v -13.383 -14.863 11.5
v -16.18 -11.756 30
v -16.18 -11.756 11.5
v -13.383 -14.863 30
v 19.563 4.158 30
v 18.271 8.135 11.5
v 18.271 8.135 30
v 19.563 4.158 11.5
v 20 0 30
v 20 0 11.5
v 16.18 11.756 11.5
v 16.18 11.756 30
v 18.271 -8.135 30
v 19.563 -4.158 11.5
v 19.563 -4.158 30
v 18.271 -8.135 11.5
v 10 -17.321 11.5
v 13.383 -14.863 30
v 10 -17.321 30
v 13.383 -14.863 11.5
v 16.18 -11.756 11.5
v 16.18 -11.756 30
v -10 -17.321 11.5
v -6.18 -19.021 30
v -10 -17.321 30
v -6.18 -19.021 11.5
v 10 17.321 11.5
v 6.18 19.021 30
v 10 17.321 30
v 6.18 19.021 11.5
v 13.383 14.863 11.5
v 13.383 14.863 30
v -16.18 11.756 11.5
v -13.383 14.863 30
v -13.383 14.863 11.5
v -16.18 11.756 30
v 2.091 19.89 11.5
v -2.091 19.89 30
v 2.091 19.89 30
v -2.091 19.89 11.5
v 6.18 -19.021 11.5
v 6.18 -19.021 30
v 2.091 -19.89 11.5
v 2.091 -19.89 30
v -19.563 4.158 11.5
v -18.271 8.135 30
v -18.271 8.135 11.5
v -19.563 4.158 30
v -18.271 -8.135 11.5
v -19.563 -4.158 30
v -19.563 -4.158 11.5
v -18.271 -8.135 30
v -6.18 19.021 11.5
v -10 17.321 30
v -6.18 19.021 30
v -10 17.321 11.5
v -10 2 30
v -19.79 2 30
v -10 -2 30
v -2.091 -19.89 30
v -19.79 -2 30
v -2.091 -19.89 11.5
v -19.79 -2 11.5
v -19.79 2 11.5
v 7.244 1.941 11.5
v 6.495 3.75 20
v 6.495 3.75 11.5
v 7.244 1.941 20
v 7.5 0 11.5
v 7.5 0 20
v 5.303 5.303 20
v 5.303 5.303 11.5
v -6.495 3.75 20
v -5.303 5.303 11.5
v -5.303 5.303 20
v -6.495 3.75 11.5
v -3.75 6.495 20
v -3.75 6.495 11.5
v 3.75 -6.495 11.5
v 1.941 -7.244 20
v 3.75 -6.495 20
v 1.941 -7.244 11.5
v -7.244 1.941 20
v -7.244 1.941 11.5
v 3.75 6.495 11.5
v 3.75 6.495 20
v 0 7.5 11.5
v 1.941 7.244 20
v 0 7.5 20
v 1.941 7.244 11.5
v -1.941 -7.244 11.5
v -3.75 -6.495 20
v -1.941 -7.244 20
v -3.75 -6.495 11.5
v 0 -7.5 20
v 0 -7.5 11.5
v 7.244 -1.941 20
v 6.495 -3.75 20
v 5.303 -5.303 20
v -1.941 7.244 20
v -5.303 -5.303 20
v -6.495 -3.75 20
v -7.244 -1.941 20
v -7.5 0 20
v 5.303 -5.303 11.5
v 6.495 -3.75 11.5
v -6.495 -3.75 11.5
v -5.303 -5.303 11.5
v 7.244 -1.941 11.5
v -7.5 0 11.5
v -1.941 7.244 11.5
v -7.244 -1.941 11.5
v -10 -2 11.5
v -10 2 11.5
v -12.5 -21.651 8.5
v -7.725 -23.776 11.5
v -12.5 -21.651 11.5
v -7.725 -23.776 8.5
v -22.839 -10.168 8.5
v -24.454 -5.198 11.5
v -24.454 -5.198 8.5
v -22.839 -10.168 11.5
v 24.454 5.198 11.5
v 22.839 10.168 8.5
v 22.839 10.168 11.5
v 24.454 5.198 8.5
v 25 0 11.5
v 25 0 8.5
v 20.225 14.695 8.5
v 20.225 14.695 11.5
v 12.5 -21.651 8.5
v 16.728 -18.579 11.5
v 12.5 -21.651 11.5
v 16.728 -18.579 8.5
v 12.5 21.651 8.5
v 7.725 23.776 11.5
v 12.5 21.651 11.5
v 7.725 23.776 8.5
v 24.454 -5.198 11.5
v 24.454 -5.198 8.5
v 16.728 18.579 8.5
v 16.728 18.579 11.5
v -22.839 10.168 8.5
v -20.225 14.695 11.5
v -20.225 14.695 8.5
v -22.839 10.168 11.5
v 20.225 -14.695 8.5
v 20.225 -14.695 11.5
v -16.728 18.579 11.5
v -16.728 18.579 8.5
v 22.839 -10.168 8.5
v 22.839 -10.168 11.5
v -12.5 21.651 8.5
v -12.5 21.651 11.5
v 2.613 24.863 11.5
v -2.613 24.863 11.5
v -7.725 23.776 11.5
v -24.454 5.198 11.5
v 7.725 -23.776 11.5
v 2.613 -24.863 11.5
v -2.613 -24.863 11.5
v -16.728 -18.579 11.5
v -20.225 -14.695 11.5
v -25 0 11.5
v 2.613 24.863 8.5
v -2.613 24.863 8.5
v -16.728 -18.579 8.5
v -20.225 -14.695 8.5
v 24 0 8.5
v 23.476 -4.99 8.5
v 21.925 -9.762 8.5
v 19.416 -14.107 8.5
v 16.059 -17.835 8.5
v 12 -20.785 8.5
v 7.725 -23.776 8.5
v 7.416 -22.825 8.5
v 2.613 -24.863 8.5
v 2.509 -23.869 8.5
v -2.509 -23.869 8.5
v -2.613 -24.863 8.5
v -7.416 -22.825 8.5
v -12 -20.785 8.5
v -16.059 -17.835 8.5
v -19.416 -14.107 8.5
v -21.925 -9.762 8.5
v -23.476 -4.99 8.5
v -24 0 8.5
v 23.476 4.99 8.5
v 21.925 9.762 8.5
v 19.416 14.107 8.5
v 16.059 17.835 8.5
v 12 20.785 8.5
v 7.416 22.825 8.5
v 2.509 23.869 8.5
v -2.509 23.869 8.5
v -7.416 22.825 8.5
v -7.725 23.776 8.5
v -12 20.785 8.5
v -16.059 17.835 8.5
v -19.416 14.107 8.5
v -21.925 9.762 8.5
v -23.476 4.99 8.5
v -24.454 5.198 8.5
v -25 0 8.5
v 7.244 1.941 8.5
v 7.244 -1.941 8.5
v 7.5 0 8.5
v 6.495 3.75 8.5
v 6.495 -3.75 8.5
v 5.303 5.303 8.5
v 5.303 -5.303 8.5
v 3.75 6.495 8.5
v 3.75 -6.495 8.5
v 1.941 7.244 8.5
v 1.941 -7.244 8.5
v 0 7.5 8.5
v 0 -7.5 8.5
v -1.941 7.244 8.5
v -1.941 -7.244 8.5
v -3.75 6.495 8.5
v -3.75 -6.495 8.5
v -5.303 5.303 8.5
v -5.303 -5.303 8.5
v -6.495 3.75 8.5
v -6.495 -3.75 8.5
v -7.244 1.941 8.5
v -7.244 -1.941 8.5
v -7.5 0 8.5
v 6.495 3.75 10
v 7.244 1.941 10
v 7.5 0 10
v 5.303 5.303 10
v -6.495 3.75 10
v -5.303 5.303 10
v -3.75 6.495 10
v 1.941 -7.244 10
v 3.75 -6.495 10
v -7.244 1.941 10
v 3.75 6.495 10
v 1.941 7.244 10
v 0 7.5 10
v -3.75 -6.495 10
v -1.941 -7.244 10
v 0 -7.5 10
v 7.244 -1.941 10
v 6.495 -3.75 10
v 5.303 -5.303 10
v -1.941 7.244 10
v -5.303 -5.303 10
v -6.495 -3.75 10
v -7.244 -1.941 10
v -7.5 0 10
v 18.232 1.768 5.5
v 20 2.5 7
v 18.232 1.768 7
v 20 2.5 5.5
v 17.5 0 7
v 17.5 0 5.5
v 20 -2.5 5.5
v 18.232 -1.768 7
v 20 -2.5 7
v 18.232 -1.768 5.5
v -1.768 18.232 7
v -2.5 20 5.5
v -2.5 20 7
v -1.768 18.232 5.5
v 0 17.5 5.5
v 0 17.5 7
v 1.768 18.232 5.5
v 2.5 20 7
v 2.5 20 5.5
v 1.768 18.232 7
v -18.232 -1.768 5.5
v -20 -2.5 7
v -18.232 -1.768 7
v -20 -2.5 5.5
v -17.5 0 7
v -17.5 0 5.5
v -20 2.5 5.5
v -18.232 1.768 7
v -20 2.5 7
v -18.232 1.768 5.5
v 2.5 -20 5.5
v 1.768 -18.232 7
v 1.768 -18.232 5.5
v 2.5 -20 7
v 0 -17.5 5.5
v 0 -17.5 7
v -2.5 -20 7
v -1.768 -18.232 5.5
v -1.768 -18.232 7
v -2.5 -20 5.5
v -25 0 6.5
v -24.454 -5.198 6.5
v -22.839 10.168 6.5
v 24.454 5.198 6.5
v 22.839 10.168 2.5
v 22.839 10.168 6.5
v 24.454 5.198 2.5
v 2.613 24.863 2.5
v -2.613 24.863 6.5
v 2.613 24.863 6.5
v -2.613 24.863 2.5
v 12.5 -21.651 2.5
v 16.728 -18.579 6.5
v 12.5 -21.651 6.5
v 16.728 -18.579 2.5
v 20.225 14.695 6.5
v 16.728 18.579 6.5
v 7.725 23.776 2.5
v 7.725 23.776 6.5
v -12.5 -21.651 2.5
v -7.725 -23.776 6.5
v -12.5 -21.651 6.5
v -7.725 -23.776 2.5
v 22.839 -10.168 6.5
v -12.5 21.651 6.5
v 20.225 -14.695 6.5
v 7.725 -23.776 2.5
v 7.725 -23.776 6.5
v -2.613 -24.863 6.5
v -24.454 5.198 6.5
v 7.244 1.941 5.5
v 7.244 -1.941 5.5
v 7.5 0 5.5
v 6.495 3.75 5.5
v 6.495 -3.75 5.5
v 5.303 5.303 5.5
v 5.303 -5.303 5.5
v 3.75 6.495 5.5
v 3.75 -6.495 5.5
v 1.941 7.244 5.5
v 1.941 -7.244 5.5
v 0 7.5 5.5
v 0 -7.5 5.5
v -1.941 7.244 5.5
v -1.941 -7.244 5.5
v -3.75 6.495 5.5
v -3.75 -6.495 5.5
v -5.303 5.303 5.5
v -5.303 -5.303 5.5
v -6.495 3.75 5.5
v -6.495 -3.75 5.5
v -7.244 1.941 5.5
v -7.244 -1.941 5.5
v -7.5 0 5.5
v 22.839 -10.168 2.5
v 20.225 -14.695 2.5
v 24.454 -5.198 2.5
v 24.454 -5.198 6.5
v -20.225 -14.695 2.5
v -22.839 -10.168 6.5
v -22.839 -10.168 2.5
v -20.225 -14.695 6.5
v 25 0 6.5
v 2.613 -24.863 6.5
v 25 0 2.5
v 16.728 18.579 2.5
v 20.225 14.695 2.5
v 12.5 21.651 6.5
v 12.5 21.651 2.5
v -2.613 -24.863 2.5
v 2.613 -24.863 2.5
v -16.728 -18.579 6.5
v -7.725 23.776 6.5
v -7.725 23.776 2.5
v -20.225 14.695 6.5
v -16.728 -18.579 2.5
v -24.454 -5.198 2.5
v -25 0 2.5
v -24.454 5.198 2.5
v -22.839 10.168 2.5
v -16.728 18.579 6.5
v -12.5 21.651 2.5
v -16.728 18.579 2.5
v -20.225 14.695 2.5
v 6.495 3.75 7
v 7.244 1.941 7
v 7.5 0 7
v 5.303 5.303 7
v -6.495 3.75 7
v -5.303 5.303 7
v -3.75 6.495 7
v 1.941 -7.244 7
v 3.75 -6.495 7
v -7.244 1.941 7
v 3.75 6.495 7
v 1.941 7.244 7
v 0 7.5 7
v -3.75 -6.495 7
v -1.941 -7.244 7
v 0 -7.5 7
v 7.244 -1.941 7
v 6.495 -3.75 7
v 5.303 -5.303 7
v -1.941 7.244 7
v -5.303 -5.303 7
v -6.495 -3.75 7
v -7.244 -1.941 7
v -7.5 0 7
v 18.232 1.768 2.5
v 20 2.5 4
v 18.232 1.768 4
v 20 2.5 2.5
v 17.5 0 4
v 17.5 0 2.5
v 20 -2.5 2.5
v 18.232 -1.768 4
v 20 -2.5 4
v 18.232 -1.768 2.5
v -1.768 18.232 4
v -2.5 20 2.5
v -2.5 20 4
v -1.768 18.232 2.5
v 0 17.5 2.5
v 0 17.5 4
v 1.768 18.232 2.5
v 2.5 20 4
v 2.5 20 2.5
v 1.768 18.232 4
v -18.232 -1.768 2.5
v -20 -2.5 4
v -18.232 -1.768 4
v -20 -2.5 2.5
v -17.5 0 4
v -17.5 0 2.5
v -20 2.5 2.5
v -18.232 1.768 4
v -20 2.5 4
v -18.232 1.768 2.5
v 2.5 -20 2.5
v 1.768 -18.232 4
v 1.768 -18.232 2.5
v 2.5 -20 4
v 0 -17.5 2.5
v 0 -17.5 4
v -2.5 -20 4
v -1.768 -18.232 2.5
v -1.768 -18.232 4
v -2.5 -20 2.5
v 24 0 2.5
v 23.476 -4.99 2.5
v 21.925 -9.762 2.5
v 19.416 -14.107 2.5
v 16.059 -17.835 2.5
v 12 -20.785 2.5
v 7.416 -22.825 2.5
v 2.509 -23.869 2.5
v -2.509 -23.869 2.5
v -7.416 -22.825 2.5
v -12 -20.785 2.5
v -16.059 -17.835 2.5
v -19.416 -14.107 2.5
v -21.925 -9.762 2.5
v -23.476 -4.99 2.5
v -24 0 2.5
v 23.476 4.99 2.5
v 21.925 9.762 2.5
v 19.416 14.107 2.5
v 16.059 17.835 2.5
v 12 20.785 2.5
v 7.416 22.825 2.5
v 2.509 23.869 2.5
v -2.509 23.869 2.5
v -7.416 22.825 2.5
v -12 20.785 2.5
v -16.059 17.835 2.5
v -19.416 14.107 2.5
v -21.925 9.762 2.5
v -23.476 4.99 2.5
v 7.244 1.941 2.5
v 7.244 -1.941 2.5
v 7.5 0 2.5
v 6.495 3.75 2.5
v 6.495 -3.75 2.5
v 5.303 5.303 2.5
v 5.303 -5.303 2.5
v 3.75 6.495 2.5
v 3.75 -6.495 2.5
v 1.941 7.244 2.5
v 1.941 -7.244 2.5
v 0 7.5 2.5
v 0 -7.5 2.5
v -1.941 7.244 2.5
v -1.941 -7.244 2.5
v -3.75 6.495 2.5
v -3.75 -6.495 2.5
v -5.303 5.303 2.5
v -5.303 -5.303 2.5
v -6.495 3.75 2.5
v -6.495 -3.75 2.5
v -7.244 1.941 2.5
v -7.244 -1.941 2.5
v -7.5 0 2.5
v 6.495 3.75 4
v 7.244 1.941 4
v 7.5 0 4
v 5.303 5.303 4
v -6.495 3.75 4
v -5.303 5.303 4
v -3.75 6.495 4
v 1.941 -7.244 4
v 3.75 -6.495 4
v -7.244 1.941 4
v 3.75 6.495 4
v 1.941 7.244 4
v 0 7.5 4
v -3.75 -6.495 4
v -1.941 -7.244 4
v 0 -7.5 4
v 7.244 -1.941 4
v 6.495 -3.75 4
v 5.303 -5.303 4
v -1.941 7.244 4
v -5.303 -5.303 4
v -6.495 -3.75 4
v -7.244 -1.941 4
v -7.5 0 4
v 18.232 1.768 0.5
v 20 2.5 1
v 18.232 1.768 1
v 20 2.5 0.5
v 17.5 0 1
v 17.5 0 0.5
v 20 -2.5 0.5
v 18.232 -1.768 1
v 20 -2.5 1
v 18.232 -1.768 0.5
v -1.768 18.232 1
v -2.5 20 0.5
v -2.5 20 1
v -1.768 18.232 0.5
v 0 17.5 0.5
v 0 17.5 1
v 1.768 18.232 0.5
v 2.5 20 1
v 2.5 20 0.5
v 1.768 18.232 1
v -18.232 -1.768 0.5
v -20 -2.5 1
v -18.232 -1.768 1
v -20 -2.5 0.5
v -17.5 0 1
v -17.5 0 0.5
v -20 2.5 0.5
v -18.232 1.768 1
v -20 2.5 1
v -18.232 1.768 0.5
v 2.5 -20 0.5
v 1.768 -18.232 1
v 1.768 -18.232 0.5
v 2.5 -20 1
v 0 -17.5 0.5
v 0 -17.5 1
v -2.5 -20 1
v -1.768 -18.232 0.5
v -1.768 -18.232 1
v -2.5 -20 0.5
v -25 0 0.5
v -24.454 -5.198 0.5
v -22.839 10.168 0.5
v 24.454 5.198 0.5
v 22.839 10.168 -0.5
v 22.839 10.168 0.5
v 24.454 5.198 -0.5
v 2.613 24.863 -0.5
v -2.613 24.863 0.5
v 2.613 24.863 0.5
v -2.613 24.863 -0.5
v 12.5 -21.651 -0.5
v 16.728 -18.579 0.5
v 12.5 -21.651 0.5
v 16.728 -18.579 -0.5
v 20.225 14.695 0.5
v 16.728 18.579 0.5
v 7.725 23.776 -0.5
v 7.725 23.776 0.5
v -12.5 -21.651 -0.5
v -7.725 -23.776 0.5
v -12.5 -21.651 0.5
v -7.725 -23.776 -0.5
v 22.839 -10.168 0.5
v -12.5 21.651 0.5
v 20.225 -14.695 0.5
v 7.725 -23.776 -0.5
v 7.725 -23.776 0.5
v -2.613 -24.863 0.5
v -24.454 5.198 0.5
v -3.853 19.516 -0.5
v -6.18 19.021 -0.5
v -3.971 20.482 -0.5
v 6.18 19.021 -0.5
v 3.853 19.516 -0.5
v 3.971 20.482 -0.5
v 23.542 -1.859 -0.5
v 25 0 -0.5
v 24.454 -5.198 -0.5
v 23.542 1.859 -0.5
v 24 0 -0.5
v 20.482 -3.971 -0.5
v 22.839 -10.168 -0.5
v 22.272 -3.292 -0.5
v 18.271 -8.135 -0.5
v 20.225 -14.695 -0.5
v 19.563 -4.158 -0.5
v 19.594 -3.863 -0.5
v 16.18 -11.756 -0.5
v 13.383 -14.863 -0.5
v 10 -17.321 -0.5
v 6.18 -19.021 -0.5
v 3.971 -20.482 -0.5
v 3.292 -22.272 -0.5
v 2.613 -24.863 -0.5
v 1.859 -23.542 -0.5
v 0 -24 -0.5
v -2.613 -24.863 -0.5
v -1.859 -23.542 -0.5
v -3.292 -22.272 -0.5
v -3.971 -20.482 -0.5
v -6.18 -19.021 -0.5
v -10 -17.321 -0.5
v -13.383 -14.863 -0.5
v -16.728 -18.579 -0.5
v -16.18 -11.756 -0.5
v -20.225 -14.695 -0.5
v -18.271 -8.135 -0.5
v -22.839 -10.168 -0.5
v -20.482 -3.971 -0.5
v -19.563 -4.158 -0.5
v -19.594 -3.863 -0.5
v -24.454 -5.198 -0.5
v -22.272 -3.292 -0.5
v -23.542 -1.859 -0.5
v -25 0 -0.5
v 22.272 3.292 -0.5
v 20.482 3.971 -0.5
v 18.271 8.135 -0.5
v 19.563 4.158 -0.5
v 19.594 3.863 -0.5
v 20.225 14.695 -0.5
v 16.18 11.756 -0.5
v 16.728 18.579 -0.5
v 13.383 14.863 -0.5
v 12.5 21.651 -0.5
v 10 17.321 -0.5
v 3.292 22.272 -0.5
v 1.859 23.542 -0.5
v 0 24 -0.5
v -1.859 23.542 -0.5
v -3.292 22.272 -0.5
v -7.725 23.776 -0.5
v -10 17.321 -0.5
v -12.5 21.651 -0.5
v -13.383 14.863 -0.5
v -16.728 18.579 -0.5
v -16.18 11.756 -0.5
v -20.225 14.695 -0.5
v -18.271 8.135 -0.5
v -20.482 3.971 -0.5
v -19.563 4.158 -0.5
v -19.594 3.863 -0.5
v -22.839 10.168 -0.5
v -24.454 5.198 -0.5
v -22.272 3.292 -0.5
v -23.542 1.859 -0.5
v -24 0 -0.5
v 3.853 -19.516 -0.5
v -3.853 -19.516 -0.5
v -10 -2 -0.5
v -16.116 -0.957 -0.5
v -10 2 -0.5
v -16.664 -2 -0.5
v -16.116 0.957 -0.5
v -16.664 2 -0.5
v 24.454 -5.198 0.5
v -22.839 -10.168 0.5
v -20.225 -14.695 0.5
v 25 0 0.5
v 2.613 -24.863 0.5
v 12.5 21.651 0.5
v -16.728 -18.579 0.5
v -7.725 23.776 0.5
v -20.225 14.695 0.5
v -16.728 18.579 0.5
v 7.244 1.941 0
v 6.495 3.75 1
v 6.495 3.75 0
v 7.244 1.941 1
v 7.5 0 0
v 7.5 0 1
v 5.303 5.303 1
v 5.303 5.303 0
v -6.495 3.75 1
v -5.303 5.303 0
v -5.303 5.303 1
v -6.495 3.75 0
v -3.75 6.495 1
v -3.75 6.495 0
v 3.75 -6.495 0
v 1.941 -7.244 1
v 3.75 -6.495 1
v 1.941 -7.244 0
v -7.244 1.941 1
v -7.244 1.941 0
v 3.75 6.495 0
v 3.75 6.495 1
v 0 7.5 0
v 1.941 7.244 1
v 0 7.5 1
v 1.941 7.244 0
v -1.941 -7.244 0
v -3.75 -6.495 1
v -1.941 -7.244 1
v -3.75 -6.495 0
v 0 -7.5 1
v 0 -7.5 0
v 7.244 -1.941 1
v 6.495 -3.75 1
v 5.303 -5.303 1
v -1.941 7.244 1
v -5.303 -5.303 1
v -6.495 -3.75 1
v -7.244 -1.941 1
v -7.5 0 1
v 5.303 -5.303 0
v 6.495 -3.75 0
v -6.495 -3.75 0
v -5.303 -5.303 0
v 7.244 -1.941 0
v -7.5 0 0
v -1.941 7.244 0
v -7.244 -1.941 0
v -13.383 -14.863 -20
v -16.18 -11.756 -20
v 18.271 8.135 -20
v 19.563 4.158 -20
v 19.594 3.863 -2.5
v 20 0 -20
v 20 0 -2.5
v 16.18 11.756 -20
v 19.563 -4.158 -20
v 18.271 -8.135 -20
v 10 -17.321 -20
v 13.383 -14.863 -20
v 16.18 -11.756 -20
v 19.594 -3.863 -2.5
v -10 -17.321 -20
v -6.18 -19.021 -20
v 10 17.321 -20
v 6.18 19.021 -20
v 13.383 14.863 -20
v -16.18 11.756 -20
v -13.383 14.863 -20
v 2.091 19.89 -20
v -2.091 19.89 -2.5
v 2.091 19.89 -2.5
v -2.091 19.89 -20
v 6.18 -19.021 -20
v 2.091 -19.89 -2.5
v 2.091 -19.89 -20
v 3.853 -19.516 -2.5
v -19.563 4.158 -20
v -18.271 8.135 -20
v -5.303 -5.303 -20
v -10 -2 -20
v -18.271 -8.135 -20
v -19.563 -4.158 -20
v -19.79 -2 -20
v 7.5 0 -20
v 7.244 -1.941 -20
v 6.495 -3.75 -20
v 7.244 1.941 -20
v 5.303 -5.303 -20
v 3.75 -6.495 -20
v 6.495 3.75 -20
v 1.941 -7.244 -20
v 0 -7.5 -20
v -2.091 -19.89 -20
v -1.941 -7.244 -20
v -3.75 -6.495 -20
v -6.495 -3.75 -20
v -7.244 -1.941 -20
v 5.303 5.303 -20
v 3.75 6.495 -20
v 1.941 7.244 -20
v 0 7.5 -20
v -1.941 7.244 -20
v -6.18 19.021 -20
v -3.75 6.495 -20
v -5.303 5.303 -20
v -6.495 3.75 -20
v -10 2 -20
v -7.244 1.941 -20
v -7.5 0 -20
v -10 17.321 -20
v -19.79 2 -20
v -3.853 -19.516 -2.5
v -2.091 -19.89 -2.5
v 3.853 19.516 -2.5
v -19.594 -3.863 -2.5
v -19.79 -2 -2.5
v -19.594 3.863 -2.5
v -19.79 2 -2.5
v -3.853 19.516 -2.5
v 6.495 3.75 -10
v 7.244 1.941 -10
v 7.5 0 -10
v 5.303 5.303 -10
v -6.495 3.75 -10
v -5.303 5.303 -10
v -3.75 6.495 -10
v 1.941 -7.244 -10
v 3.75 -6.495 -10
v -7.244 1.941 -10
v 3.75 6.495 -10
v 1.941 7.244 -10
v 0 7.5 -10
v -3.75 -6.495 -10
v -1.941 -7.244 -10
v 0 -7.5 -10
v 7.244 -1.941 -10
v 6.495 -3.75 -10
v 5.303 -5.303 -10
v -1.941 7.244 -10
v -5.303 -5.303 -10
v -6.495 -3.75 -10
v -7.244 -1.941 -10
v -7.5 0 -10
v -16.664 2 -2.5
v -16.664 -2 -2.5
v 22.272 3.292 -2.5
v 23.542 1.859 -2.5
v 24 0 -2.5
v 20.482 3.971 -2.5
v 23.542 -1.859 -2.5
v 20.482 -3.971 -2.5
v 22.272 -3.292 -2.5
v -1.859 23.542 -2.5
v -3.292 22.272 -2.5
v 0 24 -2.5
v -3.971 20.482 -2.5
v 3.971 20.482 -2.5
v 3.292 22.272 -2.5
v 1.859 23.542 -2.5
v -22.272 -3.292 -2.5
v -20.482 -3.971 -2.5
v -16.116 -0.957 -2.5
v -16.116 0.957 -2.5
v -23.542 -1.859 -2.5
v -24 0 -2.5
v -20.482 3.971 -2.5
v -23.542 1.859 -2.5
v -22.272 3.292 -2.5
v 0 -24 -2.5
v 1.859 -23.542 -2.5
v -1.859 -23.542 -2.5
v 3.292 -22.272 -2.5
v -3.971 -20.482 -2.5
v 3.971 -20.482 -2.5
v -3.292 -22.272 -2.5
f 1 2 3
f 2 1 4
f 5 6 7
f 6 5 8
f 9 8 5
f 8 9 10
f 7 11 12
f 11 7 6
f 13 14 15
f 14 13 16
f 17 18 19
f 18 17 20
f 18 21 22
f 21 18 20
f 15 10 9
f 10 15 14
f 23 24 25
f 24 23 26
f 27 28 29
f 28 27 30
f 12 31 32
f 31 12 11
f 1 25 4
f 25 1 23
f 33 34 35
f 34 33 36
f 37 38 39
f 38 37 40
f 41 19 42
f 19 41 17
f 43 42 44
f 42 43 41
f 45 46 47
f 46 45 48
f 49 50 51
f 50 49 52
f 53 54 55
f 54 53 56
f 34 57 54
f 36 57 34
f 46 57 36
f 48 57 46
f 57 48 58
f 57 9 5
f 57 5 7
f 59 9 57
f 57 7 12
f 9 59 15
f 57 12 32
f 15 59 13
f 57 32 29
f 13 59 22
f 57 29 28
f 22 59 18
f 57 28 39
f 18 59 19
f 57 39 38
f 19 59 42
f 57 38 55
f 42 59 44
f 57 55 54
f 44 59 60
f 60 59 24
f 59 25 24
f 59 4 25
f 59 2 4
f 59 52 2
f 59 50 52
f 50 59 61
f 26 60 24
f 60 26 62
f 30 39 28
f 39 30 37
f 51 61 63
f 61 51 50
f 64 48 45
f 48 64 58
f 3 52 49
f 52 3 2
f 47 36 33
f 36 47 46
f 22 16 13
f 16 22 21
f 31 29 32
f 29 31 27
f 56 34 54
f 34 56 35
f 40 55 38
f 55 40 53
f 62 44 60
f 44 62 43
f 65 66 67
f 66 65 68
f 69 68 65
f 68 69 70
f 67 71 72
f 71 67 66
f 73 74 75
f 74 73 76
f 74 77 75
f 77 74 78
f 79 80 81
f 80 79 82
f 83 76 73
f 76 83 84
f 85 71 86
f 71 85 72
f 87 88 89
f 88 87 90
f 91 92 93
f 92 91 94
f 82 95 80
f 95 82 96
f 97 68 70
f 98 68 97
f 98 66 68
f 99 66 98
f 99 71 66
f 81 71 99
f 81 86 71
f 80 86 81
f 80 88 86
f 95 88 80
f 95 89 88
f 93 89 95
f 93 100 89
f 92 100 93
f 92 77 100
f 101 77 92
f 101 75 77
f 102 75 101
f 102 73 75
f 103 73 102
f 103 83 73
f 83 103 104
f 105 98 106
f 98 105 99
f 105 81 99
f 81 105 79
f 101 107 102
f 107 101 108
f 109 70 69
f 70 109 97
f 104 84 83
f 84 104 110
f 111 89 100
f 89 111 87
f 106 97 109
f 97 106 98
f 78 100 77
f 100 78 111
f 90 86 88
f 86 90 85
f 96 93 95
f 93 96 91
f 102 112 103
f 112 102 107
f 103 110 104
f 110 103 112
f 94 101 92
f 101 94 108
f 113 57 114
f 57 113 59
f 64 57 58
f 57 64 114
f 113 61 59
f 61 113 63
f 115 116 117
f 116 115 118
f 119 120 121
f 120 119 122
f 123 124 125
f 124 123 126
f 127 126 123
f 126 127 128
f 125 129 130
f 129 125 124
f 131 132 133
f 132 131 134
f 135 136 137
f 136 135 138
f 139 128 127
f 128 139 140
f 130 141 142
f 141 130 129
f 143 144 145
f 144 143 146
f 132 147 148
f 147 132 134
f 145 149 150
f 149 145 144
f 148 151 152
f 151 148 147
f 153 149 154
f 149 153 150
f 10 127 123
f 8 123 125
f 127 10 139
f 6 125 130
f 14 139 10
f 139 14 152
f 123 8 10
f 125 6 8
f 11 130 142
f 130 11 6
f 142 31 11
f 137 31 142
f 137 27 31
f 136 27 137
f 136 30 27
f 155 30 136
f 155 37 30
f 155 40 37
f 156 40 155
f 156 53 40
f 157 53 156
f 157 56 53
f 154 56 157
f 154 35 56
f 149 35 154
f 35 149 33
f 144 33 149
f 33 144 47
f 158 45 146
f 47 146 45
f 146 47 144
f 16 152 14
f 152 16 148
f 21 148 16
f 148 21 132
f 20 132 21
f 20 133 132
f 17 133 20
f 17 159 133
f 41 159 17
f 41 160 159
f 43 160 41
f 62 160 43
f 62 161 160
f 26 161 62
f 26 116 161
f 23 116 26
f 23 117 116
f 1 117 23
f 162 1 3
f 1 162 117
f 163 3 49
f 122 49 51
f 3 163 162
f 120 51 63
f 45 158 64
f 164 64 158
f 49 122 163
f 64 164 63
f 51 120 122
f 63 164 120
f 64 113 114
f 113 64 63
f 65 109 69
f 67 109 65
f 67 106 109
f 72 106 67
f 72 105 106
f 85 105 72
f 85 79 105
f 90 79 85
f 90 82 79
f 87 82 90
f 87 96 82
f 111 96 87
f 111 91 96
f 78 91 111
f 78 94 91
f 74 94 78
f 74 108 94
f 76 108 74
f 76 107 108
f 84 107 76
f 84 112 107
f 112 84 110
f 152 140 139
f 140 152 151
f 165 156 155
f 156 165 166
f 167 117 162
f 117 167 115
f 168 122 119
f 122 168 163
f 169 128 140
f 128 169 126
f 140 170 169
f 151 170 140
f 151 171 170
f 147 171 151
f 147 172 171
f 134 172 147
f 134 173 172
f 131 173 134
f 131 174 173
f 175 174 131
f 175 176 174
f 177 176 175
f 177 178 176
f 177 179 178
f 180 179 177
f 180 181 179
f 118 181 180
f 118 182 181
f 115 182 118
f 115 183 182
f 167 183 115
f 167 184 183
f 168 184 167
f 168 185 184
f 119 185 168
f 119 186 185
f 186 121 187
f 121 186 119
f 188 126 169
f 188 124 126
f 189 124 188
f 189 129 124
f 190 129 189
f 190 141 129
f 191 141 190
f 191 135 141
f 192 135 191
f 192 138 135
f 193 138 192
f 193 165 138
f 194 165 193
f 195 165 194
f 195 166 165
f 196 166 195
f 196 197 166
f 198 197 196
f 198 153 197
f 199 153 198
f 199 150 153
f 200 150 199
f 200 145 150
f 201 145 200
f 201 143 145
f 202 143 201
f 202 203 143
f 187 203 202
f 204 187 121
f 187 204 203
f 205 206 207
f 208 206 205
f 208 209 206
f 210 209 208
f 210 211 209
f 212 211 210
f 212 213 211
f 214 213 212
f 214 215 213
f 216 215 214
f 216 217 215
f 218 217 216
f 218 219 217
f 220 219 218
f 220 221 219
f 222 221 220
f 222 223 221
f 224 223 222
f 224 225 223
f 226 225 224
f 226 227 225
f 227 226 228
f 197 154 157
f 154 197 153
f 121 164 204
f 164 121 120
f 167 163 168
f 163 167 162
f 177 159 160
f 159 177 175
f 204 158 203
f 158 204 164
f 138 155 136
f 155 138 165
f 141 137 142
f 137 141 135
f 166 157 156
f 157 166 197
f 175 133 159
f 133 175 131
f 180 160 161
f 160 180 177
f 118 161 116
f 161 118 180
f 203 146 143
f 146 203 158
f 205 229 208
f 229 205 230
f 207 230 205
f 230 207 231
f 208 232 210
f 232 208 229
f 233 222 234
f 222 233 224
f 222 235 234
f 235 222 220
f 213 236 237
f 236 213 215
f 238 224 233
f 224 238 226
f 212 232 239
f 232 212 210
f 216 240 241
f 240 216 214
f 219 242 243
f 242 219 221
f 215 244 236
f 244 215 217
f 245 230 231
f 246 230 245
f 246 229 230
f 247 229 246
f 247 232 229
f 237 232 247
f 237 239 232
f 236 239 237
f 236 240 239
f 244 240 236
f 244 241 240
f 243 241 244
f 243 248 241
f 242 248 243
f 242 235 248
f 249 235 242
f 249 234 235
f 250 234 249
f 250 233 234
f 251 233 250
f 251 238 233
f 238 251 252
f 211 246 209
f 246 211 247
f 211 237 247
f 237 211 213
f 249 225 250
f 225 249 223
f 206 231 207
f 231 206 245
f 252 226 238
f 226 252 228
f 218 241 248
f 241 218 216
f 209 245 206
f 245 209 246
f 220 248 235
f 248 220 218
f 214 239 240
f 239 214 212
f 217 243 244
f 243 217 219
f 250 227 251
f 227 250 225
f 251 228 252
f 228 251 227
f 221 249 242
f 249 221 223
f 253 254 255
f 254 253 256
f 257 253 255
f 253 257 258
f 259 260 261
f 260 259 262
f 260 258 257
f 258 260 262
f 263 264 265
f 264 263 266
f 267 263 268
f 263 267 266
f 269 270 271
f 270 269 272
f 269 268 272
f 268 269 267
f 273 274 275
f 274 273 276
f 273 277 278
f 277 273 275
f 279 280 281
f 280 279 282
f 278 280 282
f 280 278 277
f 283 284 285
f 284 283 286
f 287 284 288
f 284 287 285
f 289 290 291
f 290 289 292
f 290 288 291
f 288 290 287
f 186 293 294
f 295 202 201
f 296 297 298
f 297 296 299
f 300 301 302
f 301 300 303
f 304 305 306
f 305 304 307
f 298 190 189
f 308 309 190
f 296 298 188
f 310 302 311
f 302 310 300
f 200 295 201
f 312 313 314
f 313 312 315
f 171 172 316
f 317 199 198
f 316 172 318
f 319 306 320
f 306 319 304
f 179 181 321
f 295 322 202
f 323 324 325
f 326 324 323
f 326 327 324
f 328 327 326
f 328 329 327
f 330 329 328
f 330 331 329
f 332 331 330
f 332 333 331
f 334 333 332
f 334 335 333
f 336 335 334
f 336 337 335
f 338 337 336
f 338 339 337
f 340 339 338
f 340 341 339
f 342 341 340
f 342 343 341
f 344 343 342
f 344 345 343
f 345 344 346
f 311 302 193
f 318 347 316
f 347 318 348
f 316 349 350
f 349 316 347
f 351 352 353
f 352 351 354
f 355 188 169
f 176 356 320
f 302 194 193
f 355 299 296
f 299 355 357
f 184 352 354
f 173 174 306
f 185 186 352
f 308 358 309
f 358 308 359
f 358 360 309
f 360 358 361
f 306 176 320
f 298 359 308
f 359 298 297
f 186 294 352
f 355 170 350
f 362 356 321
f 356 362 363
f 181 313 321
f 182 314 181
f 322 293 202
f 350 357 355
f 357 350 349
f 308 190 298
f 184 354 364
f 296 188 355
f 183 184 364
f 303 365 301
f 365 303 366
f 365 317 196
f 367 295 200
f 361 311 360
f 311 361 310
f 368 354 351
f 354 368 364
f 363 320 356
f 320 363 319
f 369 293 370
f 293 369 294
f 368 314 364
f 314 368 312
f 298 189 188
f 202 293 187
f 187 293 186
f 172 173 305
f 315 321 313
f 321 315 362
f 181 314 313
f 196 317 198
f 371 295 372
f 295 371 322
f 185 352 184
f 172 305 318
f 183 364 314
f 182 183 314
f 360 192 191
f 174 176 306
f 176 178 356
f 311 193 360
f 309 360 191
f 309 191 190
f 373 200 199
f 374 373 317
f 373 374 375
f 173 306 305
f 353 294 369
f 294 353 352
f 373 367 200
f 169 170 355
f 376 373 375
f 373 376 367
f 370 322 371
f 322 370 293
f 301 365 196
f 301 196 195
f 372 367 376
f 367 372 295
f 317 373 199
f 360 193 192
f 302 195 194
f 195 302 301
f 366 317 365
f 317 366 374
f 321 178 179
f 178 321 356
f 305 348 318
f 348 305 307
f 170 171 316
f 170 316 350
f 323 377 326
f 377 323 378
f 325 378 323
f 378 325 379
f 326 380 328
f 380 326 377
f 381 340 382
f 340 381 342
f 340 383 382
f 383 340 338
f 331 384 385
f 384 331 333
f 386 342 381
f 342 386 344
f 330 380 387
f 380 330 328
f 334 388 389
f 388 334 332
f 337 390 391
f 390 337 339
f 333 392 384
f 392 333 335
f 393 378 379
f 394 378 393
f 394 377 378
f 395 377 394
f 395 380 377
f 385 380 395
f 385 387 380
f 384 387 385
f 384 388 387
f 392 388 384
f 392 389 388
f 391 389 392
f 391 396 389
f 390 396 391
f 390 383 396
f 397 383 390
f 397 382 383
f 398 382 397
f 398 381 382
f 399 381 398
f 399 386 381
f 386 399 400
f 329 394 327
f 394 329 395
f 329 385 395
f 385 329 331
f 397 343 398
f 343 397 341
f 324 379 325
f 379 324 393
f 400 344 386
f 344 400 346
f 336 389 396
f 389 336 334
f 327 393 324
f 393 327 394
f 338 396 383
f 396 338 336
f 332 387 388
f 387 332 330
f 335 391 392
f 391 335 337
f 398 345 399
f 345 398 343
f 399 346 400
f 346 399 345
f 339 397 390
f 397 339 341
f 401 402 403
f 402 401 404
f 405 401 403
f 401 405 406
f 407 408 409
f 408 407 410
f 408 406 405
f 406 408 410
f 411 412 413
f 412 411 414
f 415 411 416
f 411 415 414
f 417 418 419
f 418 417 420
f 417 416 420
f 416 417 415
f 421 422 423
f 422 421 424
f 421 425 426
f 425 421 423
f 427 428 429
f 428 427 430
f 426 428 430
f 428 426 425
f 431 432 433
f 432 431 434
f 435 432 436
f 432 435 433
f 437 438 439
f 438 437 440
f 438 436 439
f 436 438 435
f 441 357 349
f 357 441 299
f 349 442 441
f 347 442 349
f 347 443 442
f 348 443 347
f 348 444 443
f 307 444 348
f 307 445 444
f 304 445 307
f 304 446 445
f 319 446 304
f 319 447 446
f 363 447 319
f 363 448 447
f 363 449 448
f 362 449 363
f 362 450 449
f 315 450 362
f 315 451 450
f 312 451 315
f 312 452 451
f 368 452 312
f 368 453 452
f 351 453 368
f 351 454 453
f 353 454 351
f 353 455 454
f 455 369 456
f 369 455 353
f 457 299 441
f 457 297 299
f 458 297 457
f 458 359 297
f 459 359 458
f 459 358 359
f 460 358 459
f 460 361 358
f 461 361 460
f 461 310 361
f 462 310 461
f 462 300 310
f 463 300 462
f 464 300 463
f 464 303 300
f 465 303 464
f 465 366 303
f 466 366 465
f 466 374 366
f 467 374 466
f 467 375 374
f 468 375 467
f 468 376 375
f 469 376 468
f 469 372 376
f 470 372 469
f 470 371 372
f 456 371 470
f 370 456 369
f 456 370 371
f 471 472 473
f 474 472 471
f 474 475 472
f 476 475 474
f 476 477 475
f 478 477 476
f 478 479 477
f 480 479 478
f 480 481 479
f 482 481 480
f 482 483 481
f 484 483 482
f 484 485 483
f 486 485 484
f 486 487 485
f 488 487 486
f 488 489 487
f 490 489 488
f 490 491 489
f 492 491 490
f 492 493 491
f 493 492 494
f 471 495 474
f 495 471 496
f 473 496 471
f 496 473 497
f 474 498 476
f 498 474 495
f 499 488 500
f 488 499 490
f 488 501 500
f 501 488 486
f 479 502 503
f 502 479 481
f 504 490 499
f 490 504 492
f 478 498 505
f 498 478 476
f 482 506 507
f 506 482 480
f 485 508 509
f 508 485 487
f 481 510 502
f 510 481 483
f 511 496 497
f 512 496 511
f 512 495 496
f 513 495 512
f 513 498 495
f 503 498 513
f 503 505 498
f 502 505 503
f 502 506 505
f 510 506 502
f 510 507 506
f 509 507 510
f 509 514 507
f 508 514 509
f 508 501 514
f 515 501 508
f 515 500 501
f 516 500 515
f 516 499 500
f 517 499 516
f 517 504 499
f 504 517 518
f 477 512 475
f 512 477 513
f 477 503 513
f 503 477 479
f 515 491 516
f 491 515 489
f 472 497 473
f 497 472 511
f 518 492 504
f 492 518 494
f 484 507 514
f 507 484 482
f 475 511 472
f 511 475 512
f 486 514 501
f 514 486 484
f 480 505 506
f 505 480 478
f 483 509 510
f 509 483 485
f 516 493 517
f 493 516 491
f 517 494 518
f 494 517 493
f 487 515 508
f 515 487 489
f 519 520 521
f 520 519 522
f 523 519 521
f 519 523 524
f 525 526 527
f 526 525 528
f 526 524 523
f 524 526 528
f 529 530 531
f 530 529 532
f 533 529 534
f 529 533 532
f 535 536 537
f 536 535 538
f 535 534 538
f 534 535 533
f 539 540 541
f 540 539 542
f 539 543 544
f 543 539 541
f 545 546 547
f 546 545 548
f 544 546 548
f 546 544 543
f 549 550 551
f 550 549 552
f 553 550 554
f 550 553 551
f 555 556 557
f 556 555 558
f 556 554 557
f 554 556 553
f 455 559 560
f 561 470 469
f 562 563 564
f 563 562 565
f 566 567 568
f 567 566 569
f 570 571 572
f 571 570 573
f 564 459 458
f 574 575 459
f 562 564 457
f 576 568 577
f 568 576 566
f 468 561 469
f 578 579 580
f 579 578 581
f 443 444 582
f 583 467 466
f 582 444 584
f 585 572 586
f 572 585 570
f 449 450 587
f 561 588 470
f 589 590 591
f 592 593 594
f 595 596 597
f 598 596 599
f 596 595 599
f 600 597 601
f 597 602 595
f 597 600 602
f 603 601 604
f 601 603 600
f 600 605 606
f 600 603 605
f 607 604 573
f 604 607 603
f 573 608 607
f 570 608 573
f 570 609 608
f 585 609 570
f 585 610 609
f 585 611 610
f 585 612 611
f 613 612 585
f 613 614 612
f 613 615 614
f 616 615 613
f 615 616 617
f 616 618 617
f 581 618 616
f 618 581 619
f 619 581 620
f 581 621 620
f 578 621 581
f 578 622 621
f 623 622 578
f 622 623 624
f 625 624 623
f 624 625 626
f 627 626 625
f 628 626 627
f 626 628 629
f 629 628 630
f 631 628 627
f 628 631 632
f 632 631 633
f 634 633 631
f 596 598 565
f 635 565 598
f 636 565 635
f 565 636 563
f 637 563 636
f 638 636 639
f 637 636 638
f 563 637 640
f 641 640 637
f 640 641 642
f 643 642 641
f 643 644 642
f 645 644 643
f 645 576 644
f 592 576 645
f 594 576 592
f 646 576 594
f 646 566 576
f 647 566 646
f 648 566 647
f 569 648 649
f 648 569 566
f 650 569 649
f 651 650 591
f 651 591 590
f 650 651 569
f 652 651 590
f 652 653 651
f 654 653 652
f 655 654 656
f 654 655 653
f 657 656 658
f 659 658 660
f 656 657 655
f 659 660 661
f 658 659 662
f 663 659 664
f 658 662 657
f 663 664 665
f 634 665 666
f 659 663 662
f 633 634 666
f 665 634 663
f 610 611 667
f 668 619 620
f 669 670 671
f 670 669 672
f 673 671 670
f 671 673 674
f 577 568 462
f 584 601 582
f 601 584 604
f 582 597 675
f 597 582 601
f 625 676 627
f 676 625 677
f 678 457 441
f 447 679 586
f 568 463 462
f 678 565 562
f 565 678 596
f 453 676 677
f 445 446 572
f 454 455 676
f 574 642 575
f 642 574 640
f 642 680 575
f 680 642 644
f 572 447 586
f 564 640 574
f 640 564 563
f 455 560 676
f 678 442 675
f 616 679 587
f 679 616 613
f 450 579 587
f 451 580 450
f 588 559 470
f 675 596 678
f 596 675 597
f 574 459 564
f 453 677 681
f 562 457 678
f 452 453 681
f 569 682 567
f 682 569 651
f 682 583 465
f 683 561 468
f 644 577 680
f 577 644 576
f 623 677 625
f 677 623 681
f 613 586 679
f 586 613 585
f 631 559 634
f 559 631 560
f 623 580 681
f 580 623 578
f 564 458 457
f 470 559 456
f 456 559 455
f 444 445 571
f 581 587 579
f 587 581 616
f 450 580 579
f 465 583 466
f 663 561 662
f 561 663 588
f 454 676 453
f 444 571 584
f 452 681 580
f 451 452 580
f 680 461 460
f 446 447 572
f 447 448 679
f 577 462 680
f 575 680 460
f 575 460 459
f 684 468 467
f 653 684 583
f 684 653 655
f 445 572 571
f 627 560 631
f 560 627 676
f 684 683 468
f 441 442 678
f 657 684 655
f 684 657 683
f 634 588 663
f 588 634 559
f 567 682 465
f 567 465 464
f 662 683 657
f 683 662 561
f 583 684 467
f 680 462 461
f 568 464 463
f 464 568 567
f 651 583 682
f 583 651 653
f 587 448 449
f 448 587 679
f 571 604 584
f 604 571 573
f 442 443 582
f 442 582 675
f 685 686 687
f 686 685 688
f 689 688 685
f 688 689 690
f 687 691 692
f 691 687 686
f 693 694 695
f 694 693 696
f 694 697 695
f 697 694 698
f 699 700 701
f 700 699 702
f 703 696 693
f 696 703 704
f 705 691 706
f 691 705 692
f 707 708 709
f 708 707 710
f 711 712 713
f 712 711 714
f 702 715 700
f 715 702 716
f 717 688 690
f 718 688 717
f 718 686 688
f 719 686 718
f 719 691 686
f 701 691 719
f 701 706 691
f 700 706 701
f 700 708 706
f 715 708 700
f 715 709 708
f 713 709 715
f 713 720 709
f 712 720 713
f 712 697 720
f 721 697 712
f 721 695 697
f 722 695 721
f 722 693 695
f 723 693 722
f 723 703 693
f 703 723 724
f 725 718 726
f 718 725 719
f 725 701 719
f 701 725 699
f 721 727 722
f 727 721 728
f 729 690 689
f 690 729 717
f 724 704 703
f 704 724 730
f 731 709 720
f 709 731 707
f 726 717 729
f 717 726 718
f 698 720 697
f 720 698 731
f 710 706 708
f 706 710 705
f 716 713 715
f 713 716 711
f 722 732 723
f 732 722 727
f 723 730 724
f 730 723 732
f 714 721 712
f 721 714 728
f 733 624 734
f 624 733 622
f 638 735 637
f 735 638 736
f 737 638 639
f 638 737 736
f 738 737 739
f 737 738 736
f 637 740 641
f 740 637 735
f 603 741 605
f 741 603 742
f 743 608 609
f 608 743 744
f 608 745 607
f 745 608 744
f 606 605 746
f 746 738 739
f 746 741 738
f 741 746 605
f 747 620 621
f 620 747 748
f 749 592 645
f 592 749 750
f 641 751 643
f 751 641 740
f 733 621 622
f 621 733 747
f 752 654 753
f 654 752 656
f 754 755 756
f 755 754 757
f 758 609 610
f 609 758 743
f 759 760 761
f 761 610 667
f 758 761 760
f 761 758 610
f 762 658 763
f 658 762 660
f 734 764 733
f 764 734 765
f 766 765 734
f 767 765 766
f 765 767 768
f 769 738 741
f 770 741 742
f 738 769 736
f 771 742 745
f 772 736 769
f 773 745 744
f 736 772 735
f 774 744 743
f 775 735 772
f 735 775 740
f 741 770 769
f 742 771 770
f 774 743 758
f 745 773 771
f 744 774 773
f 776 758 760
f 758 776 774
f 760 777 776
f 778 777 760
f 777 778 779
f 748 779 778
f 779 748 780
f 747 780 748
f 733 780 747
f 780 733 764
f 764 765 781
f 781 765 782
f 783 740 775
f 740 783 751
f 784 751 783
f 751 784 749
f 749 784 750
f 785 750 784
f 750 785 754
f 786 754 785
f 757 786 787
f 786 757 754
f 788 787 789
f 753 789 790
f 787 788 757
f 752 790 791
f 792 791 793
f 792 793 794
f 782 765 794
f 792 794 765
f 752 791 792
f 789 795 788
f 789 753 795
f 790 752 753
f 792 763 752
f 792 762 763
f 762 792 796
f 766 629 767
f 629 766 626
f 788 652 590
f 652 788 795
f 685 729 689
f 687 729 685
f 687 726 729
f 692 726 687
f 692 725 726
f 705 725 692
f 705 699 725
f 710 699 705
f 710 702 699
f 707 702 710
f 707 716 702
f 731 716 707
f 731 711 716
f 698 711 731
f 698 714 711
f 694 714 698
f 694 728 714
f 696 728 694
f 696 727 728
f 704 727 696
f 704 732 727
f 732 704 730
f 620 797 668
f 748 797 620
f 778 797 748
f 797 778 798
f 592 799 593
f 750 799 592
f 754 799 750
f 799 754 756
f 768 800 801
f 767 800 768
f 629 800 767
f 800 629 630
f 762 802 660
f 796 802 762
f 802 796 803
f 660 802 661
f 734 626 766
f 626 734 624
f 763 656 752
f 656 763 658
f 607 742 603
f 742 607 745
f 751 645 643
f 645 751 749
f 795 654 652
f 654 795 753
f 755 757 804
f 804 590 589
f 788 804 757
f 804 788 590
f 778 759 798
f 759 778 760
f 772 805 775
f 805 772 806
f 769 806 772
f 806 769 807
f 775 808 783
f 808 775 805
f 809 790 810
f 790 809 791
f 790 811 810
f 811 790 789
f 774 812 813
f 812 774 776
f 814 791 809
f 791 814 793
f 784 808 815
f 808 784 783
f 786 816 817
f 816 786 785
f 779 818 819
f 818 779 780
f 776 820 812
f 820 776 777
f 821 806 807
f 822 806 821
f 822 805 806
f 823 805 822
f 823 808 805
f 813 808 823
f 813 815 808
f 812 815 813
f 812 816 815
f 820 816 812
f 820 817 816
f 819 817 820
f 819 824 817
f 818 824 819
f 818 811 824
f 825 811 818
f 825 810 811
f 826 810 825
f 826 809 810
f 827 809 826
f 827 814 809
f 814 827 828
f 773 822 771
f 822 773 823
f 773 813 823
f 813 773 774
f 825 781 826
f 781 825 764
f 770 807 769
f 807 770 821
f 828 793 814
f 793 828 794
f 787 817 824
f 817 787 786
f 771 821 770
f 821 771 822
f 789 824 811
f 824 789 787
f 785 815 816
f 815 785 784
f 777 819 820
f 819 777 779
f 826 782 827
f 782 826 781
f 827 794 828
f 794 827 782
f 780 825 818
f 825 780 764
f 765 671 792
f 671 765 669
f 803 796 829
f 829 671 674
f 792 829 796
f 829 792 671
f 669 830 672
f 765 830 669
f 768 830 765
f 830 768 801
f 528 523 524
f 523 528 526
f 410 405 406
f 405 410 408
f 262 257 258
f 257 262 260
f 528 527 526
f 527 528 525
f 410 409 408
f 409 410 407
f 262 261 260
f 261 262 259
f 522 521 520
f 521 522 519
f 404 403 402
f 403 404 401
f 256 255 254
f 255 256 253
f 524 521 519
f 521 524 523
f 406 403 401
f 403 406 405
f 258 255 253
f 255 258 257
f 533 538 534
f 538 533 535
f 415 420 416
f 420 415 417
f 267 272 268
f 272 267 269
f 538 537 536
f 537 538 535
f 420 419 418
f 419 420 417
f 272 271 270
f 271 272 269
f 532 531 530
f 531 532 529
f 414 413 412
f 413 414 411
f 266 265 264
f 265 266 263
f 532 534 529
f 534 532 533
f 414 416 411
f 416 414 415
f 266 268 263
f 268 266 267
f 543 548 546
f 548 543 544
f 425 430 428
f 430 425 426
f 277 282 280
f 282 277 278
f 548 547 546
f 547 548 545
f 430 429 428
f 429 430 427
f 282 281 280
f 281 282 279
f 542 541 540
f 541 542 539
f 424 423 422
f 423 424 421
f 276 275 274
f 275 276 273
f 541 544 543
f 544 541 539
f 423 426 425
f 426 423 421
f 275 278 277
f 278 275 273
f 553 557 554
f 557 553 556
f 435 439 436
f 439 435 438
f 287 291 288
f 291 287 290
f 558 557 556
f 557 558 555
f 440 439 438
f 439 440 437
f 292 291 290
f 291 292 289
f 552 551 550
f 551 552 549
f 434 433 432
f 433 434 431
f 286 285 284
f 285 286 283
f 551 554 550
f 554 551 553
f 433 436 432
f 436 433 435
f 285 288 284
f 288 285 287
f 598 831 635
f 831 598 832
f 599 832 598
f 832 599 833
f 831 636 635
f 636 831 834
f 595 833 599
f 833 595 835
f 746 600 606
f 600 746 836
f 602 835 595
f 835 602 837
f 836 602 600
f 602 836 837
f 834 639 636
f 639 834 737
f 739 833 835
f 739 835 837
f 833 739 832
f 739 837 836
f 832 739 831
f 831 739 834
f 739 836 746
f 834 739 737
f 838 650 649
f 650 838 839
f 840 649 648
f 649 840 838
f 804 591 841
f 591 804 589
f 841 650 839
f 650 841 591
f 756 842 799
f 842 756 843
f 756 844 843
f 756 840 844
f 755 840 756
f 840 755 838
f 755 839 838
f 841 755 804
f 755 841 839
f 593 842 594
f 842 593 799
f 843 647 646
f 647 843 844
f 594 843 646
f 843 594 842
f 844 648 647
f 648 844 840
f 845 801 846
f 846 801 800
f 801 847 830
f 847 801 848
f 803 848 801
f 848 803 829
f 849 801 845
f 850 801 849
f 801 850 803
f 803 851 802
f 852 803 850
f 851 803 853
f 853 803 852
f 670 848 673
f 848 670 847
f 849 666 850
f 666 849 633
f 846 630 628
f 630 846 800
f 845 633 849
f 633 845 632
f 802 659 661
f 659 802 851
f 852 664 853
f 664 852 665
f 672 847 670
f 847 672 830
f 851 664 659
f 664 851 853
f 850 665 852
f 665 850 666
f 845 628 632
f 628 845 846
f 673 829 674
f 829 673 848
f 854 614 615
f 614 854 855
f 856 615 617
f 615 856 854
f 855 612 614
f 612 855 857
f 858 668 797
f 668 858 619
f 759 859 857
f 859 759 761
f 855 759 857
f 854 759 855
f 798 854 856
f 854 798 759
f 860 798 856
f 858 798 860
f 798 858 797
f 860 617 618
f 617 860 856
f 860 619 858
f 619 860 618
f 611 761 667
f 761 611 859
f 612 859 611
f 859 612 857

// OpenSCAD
// Module for a cylindrical hub with a keyway slot (shortened and simplified)
module shaft_hub() {
    difference() {
        cylinder(h=20, d=40, center=true); // Shortened hub
        translate([0, 0, -10]) cylinder(h=20, d=15, center=true); // Central hole
        translate([-20, -2, -10]) cube([10, 4, 20]); // Keyway slot
    }
}

// Module for a thinner flange plate with bolt holes
module flange_plate() {
    difference() {
        cylinder(h=3, d=50, center=true); // Thinner flange
        translate([0, 0, -1.5]) cylinder(h=3, d=15, center=true); // Central hole
        for (i = [0:90:270]) {
            rotate([0, 0, i]) translate([20, 0, -1.5]) cylinder(h=3, d=5, center=true); // Bolt holes
        }
    }
}

// Module for a flexible spacer ring with a curved profile
module flexible_spacer_ring() {
    difference() {
        hull() { // Creating a slightly curved profile
            translate([0, 0, -1]) cylinder(h=1, d=50, center=true);
            translate([0, 0, 1]) cylinder(h=1, d=48, center=true);
        }
        translate([0, 0, -1]) cylinder(h=2, d=15, center=true); // Central hole
        for (i = [0:90:270]) {
            rotate([0, 0, i]) translate([20, 0, -1]) cylinder(h=2, d=5, center=true); // Bolt holes
        }
    }
}

// Module for a shorter bolt with a hexagonal head
module bolt() {
    union() {
        cylinder(h=10, d=5, center=true); // Shorter bolt
        translate([0, 0, 5]) cylinder(h=3, d1=8, d2=5, center=true); // Hexagonal head
    }
}

// Module for a hexagonal nut
module nut() {
    cylinder(h=3, d=8, center=true);
}

// Assemble the coupling with corrected components
module coupling() {
    translate([0, 0, 20]) shaft_hub(); // Input shaft hub
    translate([0, 0, 10]) flange_plate(); // First flange plate
    translate([0, 0, 7]) flexible_spacer_ring(); // First flexible spacer ring
    translate([0, 0, 4]) flange_plate(); // Second flange plate
    translate([0, 0, 1]) flexible_spacer_ring(); // Second flexible spacer ring
    translate([0, 0, -10]) shaft_hub(); // Output shaft hub

    // Bolts and nuts (shortened and repositioned)
    for (i = [0:90:270]) {
        rotate([0, 0, i]) translate([20, 0, 4]) bolt();
        rotate([0, 0, i]) translate([20, 0, -1]) nut();
    }
}

// Render the coupling
coupling();
